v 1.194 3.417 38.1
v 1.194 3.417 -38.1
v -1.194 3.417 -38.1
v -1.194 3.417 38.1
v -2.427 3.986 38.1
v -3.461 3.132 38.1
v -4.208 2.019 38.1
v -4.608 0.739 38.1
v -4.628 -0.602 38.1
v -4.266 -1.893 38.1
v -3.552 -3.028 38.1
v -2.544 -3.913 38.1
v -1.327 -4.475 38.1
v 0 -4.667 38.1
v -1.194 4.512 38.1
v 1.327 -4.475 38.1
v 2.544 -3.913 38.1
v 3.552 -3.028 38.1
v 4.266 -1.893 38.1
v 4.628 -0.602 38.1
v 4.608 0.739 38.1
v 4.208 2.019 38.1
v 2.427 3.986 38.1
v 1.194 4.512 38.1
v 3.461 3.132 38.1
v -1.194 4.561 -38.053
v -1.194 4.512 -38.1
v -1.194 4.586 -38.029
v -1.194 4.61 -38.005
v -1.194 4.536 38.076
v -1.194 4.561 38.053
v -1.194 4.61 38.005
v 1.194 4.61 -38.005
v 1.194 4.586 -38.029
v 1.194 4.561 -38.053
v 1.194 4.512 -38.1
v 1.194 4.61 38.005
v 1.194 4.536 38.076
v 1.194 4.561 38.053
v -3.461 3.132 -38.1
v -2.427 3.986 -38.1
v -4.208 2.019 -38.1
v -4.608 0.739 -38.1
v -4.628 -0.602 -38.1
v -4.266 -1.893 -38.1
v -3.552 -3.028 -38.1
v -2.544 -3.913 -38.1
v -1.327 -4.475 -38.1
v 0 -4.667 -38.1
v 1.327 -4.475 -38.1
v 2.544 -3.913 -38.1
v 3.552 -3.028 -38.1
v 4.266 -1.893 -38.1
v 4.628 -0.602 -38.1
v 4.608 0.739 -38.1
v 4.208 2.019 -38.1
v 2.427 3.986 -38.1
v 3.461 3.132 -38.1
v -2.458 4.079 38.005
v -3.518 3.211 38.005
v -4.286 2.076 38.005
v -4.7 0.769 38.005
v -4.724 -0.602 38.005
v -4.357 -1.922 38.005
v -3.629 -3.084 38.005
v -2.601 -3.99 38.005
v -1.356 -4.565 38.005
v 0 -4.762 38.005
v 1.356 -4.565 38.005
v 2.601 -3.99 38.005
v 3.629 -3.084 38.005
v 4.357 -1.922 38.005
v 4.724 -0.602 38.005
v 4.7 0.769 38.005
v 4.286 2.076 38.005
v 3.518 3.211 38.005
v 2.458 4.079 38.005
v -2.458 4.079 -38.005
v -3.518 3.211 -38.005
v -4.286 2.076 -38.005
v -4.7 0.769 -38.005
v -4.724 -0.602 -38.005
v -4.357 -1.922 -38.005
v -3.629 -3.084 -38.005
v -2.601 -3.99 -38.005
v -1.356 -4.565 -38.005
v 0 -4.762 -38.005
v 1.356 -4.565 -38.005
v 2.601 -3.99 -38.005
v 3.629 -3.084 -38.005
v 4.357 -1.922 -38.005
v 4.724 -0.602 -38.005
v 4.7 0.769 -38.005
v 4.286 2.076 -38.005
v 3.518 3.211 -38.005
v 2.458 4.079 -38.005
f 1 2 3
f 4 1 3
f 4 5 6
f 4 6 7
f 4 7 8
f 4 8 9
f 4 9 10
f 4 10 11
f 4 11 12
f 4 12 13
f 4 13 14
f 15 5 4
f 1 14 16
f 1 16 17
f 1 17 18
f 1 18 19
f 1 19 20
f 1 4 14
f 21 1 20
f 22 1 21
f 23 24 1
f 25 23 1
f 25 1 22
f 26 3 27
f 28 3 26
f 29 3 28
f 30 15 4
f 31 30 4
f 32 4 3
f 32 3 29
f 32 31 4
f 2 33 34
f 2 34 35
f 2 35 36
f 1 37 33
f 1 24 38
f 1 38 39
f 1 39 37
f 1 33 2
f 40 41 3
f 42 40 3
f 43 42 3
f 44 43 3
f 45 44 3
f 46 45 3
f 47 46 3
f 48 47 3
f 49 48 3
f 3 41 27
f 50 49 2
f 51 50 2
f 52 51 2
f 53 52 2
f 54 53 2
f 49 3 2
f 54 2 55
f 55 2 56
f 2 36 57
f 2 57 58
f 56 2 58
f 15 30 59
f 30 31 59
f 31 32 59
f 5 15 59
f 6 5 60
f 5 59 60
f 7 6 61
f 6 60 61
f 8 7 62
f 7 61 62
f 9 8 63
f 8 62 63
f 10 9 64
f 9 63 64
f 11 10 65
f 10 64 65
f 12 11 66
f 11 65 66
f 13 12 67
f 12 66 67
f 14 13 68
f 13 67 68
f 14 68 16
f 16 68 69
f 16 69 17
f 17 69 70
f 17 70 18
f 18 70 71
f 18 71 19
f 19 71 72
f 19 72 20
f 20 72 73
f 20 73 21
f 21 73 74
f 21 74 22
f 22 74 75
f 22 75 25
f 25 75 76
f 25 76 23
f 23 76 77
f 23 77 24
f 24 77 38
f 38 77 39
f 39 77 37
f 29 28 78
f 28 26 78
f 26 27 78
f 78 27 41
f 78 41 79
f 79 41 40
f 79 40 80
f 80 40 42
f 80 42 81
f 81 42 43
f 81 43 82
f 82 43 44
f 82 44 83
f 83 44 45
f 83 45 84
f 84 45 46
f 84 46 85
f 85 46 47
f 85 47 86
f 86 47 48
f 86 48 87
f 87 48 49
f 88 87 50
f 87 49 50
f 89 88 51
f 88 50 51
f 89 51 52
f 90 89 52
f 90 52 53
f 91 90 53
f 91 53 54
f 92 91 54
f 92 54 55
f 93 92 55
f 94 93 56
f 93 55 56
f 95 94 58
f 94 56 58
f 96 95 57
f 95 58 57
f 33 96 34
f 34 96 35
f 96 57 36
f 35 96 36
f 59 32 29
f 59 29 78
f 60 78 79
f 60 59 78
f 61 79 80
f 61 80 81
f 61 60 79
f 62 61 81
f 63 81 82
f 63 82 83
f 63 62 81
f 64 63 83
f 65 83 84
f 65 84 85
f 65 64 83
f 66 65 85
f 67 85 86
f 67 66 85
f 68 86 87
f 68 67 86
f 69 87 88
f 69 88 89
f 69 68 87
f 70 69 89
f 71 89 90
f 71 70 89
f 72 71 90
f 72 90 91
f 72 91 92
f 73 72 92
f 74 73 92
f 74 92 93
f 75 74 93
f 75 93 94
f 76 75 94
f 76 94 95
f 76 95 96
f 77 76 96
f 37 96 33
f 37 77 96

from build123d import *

# Parameters (mm, degrees)
BOSS_EXTRUDE1_DEPTH      = 38.1
BOSS_EXTRUDE1_DEPTH_BACK = 38.1
CHAMFER1_SIZE            = 0.09525


with BuildPart() as part:
    # Sketch3 → Boss-Extrude1 (new body, two sides)
    with BuildSketch(Plane.XY) as boss_extrude1_sk:
        with BuildLine():
            Line((-1.1938, 3.416649849), (-1.1938, 4.610449849))
            ThreePointArc((-1.1938, 4.610449849), (0, -4.7625), (1.1938, 4.610449849))
            Line((1.1938, 4.610449849), (1.1938, 3.416649849))
            Line((1.1938, 3.416649849), (-1.1938, 3.416649849))
        make_face()
    extrude(amount=BOSS_EXTRUDE1_DEPTH)
    extrude(boss_extrude1_sk.sketch, amount=-BOSS_EXTRUDE1_DEPTH_BACK)

    # Chamfer1
    chamfer1_edges = [part.edges().sort_by_distance(p)[0] for p in [
        (0, -4.7625, -38.1),
        (0, -4.7625, 38.1),
    ]]
    chamfer(chamfer1_edges, length=CHAMFER1_SIZE)


solid = part.part
